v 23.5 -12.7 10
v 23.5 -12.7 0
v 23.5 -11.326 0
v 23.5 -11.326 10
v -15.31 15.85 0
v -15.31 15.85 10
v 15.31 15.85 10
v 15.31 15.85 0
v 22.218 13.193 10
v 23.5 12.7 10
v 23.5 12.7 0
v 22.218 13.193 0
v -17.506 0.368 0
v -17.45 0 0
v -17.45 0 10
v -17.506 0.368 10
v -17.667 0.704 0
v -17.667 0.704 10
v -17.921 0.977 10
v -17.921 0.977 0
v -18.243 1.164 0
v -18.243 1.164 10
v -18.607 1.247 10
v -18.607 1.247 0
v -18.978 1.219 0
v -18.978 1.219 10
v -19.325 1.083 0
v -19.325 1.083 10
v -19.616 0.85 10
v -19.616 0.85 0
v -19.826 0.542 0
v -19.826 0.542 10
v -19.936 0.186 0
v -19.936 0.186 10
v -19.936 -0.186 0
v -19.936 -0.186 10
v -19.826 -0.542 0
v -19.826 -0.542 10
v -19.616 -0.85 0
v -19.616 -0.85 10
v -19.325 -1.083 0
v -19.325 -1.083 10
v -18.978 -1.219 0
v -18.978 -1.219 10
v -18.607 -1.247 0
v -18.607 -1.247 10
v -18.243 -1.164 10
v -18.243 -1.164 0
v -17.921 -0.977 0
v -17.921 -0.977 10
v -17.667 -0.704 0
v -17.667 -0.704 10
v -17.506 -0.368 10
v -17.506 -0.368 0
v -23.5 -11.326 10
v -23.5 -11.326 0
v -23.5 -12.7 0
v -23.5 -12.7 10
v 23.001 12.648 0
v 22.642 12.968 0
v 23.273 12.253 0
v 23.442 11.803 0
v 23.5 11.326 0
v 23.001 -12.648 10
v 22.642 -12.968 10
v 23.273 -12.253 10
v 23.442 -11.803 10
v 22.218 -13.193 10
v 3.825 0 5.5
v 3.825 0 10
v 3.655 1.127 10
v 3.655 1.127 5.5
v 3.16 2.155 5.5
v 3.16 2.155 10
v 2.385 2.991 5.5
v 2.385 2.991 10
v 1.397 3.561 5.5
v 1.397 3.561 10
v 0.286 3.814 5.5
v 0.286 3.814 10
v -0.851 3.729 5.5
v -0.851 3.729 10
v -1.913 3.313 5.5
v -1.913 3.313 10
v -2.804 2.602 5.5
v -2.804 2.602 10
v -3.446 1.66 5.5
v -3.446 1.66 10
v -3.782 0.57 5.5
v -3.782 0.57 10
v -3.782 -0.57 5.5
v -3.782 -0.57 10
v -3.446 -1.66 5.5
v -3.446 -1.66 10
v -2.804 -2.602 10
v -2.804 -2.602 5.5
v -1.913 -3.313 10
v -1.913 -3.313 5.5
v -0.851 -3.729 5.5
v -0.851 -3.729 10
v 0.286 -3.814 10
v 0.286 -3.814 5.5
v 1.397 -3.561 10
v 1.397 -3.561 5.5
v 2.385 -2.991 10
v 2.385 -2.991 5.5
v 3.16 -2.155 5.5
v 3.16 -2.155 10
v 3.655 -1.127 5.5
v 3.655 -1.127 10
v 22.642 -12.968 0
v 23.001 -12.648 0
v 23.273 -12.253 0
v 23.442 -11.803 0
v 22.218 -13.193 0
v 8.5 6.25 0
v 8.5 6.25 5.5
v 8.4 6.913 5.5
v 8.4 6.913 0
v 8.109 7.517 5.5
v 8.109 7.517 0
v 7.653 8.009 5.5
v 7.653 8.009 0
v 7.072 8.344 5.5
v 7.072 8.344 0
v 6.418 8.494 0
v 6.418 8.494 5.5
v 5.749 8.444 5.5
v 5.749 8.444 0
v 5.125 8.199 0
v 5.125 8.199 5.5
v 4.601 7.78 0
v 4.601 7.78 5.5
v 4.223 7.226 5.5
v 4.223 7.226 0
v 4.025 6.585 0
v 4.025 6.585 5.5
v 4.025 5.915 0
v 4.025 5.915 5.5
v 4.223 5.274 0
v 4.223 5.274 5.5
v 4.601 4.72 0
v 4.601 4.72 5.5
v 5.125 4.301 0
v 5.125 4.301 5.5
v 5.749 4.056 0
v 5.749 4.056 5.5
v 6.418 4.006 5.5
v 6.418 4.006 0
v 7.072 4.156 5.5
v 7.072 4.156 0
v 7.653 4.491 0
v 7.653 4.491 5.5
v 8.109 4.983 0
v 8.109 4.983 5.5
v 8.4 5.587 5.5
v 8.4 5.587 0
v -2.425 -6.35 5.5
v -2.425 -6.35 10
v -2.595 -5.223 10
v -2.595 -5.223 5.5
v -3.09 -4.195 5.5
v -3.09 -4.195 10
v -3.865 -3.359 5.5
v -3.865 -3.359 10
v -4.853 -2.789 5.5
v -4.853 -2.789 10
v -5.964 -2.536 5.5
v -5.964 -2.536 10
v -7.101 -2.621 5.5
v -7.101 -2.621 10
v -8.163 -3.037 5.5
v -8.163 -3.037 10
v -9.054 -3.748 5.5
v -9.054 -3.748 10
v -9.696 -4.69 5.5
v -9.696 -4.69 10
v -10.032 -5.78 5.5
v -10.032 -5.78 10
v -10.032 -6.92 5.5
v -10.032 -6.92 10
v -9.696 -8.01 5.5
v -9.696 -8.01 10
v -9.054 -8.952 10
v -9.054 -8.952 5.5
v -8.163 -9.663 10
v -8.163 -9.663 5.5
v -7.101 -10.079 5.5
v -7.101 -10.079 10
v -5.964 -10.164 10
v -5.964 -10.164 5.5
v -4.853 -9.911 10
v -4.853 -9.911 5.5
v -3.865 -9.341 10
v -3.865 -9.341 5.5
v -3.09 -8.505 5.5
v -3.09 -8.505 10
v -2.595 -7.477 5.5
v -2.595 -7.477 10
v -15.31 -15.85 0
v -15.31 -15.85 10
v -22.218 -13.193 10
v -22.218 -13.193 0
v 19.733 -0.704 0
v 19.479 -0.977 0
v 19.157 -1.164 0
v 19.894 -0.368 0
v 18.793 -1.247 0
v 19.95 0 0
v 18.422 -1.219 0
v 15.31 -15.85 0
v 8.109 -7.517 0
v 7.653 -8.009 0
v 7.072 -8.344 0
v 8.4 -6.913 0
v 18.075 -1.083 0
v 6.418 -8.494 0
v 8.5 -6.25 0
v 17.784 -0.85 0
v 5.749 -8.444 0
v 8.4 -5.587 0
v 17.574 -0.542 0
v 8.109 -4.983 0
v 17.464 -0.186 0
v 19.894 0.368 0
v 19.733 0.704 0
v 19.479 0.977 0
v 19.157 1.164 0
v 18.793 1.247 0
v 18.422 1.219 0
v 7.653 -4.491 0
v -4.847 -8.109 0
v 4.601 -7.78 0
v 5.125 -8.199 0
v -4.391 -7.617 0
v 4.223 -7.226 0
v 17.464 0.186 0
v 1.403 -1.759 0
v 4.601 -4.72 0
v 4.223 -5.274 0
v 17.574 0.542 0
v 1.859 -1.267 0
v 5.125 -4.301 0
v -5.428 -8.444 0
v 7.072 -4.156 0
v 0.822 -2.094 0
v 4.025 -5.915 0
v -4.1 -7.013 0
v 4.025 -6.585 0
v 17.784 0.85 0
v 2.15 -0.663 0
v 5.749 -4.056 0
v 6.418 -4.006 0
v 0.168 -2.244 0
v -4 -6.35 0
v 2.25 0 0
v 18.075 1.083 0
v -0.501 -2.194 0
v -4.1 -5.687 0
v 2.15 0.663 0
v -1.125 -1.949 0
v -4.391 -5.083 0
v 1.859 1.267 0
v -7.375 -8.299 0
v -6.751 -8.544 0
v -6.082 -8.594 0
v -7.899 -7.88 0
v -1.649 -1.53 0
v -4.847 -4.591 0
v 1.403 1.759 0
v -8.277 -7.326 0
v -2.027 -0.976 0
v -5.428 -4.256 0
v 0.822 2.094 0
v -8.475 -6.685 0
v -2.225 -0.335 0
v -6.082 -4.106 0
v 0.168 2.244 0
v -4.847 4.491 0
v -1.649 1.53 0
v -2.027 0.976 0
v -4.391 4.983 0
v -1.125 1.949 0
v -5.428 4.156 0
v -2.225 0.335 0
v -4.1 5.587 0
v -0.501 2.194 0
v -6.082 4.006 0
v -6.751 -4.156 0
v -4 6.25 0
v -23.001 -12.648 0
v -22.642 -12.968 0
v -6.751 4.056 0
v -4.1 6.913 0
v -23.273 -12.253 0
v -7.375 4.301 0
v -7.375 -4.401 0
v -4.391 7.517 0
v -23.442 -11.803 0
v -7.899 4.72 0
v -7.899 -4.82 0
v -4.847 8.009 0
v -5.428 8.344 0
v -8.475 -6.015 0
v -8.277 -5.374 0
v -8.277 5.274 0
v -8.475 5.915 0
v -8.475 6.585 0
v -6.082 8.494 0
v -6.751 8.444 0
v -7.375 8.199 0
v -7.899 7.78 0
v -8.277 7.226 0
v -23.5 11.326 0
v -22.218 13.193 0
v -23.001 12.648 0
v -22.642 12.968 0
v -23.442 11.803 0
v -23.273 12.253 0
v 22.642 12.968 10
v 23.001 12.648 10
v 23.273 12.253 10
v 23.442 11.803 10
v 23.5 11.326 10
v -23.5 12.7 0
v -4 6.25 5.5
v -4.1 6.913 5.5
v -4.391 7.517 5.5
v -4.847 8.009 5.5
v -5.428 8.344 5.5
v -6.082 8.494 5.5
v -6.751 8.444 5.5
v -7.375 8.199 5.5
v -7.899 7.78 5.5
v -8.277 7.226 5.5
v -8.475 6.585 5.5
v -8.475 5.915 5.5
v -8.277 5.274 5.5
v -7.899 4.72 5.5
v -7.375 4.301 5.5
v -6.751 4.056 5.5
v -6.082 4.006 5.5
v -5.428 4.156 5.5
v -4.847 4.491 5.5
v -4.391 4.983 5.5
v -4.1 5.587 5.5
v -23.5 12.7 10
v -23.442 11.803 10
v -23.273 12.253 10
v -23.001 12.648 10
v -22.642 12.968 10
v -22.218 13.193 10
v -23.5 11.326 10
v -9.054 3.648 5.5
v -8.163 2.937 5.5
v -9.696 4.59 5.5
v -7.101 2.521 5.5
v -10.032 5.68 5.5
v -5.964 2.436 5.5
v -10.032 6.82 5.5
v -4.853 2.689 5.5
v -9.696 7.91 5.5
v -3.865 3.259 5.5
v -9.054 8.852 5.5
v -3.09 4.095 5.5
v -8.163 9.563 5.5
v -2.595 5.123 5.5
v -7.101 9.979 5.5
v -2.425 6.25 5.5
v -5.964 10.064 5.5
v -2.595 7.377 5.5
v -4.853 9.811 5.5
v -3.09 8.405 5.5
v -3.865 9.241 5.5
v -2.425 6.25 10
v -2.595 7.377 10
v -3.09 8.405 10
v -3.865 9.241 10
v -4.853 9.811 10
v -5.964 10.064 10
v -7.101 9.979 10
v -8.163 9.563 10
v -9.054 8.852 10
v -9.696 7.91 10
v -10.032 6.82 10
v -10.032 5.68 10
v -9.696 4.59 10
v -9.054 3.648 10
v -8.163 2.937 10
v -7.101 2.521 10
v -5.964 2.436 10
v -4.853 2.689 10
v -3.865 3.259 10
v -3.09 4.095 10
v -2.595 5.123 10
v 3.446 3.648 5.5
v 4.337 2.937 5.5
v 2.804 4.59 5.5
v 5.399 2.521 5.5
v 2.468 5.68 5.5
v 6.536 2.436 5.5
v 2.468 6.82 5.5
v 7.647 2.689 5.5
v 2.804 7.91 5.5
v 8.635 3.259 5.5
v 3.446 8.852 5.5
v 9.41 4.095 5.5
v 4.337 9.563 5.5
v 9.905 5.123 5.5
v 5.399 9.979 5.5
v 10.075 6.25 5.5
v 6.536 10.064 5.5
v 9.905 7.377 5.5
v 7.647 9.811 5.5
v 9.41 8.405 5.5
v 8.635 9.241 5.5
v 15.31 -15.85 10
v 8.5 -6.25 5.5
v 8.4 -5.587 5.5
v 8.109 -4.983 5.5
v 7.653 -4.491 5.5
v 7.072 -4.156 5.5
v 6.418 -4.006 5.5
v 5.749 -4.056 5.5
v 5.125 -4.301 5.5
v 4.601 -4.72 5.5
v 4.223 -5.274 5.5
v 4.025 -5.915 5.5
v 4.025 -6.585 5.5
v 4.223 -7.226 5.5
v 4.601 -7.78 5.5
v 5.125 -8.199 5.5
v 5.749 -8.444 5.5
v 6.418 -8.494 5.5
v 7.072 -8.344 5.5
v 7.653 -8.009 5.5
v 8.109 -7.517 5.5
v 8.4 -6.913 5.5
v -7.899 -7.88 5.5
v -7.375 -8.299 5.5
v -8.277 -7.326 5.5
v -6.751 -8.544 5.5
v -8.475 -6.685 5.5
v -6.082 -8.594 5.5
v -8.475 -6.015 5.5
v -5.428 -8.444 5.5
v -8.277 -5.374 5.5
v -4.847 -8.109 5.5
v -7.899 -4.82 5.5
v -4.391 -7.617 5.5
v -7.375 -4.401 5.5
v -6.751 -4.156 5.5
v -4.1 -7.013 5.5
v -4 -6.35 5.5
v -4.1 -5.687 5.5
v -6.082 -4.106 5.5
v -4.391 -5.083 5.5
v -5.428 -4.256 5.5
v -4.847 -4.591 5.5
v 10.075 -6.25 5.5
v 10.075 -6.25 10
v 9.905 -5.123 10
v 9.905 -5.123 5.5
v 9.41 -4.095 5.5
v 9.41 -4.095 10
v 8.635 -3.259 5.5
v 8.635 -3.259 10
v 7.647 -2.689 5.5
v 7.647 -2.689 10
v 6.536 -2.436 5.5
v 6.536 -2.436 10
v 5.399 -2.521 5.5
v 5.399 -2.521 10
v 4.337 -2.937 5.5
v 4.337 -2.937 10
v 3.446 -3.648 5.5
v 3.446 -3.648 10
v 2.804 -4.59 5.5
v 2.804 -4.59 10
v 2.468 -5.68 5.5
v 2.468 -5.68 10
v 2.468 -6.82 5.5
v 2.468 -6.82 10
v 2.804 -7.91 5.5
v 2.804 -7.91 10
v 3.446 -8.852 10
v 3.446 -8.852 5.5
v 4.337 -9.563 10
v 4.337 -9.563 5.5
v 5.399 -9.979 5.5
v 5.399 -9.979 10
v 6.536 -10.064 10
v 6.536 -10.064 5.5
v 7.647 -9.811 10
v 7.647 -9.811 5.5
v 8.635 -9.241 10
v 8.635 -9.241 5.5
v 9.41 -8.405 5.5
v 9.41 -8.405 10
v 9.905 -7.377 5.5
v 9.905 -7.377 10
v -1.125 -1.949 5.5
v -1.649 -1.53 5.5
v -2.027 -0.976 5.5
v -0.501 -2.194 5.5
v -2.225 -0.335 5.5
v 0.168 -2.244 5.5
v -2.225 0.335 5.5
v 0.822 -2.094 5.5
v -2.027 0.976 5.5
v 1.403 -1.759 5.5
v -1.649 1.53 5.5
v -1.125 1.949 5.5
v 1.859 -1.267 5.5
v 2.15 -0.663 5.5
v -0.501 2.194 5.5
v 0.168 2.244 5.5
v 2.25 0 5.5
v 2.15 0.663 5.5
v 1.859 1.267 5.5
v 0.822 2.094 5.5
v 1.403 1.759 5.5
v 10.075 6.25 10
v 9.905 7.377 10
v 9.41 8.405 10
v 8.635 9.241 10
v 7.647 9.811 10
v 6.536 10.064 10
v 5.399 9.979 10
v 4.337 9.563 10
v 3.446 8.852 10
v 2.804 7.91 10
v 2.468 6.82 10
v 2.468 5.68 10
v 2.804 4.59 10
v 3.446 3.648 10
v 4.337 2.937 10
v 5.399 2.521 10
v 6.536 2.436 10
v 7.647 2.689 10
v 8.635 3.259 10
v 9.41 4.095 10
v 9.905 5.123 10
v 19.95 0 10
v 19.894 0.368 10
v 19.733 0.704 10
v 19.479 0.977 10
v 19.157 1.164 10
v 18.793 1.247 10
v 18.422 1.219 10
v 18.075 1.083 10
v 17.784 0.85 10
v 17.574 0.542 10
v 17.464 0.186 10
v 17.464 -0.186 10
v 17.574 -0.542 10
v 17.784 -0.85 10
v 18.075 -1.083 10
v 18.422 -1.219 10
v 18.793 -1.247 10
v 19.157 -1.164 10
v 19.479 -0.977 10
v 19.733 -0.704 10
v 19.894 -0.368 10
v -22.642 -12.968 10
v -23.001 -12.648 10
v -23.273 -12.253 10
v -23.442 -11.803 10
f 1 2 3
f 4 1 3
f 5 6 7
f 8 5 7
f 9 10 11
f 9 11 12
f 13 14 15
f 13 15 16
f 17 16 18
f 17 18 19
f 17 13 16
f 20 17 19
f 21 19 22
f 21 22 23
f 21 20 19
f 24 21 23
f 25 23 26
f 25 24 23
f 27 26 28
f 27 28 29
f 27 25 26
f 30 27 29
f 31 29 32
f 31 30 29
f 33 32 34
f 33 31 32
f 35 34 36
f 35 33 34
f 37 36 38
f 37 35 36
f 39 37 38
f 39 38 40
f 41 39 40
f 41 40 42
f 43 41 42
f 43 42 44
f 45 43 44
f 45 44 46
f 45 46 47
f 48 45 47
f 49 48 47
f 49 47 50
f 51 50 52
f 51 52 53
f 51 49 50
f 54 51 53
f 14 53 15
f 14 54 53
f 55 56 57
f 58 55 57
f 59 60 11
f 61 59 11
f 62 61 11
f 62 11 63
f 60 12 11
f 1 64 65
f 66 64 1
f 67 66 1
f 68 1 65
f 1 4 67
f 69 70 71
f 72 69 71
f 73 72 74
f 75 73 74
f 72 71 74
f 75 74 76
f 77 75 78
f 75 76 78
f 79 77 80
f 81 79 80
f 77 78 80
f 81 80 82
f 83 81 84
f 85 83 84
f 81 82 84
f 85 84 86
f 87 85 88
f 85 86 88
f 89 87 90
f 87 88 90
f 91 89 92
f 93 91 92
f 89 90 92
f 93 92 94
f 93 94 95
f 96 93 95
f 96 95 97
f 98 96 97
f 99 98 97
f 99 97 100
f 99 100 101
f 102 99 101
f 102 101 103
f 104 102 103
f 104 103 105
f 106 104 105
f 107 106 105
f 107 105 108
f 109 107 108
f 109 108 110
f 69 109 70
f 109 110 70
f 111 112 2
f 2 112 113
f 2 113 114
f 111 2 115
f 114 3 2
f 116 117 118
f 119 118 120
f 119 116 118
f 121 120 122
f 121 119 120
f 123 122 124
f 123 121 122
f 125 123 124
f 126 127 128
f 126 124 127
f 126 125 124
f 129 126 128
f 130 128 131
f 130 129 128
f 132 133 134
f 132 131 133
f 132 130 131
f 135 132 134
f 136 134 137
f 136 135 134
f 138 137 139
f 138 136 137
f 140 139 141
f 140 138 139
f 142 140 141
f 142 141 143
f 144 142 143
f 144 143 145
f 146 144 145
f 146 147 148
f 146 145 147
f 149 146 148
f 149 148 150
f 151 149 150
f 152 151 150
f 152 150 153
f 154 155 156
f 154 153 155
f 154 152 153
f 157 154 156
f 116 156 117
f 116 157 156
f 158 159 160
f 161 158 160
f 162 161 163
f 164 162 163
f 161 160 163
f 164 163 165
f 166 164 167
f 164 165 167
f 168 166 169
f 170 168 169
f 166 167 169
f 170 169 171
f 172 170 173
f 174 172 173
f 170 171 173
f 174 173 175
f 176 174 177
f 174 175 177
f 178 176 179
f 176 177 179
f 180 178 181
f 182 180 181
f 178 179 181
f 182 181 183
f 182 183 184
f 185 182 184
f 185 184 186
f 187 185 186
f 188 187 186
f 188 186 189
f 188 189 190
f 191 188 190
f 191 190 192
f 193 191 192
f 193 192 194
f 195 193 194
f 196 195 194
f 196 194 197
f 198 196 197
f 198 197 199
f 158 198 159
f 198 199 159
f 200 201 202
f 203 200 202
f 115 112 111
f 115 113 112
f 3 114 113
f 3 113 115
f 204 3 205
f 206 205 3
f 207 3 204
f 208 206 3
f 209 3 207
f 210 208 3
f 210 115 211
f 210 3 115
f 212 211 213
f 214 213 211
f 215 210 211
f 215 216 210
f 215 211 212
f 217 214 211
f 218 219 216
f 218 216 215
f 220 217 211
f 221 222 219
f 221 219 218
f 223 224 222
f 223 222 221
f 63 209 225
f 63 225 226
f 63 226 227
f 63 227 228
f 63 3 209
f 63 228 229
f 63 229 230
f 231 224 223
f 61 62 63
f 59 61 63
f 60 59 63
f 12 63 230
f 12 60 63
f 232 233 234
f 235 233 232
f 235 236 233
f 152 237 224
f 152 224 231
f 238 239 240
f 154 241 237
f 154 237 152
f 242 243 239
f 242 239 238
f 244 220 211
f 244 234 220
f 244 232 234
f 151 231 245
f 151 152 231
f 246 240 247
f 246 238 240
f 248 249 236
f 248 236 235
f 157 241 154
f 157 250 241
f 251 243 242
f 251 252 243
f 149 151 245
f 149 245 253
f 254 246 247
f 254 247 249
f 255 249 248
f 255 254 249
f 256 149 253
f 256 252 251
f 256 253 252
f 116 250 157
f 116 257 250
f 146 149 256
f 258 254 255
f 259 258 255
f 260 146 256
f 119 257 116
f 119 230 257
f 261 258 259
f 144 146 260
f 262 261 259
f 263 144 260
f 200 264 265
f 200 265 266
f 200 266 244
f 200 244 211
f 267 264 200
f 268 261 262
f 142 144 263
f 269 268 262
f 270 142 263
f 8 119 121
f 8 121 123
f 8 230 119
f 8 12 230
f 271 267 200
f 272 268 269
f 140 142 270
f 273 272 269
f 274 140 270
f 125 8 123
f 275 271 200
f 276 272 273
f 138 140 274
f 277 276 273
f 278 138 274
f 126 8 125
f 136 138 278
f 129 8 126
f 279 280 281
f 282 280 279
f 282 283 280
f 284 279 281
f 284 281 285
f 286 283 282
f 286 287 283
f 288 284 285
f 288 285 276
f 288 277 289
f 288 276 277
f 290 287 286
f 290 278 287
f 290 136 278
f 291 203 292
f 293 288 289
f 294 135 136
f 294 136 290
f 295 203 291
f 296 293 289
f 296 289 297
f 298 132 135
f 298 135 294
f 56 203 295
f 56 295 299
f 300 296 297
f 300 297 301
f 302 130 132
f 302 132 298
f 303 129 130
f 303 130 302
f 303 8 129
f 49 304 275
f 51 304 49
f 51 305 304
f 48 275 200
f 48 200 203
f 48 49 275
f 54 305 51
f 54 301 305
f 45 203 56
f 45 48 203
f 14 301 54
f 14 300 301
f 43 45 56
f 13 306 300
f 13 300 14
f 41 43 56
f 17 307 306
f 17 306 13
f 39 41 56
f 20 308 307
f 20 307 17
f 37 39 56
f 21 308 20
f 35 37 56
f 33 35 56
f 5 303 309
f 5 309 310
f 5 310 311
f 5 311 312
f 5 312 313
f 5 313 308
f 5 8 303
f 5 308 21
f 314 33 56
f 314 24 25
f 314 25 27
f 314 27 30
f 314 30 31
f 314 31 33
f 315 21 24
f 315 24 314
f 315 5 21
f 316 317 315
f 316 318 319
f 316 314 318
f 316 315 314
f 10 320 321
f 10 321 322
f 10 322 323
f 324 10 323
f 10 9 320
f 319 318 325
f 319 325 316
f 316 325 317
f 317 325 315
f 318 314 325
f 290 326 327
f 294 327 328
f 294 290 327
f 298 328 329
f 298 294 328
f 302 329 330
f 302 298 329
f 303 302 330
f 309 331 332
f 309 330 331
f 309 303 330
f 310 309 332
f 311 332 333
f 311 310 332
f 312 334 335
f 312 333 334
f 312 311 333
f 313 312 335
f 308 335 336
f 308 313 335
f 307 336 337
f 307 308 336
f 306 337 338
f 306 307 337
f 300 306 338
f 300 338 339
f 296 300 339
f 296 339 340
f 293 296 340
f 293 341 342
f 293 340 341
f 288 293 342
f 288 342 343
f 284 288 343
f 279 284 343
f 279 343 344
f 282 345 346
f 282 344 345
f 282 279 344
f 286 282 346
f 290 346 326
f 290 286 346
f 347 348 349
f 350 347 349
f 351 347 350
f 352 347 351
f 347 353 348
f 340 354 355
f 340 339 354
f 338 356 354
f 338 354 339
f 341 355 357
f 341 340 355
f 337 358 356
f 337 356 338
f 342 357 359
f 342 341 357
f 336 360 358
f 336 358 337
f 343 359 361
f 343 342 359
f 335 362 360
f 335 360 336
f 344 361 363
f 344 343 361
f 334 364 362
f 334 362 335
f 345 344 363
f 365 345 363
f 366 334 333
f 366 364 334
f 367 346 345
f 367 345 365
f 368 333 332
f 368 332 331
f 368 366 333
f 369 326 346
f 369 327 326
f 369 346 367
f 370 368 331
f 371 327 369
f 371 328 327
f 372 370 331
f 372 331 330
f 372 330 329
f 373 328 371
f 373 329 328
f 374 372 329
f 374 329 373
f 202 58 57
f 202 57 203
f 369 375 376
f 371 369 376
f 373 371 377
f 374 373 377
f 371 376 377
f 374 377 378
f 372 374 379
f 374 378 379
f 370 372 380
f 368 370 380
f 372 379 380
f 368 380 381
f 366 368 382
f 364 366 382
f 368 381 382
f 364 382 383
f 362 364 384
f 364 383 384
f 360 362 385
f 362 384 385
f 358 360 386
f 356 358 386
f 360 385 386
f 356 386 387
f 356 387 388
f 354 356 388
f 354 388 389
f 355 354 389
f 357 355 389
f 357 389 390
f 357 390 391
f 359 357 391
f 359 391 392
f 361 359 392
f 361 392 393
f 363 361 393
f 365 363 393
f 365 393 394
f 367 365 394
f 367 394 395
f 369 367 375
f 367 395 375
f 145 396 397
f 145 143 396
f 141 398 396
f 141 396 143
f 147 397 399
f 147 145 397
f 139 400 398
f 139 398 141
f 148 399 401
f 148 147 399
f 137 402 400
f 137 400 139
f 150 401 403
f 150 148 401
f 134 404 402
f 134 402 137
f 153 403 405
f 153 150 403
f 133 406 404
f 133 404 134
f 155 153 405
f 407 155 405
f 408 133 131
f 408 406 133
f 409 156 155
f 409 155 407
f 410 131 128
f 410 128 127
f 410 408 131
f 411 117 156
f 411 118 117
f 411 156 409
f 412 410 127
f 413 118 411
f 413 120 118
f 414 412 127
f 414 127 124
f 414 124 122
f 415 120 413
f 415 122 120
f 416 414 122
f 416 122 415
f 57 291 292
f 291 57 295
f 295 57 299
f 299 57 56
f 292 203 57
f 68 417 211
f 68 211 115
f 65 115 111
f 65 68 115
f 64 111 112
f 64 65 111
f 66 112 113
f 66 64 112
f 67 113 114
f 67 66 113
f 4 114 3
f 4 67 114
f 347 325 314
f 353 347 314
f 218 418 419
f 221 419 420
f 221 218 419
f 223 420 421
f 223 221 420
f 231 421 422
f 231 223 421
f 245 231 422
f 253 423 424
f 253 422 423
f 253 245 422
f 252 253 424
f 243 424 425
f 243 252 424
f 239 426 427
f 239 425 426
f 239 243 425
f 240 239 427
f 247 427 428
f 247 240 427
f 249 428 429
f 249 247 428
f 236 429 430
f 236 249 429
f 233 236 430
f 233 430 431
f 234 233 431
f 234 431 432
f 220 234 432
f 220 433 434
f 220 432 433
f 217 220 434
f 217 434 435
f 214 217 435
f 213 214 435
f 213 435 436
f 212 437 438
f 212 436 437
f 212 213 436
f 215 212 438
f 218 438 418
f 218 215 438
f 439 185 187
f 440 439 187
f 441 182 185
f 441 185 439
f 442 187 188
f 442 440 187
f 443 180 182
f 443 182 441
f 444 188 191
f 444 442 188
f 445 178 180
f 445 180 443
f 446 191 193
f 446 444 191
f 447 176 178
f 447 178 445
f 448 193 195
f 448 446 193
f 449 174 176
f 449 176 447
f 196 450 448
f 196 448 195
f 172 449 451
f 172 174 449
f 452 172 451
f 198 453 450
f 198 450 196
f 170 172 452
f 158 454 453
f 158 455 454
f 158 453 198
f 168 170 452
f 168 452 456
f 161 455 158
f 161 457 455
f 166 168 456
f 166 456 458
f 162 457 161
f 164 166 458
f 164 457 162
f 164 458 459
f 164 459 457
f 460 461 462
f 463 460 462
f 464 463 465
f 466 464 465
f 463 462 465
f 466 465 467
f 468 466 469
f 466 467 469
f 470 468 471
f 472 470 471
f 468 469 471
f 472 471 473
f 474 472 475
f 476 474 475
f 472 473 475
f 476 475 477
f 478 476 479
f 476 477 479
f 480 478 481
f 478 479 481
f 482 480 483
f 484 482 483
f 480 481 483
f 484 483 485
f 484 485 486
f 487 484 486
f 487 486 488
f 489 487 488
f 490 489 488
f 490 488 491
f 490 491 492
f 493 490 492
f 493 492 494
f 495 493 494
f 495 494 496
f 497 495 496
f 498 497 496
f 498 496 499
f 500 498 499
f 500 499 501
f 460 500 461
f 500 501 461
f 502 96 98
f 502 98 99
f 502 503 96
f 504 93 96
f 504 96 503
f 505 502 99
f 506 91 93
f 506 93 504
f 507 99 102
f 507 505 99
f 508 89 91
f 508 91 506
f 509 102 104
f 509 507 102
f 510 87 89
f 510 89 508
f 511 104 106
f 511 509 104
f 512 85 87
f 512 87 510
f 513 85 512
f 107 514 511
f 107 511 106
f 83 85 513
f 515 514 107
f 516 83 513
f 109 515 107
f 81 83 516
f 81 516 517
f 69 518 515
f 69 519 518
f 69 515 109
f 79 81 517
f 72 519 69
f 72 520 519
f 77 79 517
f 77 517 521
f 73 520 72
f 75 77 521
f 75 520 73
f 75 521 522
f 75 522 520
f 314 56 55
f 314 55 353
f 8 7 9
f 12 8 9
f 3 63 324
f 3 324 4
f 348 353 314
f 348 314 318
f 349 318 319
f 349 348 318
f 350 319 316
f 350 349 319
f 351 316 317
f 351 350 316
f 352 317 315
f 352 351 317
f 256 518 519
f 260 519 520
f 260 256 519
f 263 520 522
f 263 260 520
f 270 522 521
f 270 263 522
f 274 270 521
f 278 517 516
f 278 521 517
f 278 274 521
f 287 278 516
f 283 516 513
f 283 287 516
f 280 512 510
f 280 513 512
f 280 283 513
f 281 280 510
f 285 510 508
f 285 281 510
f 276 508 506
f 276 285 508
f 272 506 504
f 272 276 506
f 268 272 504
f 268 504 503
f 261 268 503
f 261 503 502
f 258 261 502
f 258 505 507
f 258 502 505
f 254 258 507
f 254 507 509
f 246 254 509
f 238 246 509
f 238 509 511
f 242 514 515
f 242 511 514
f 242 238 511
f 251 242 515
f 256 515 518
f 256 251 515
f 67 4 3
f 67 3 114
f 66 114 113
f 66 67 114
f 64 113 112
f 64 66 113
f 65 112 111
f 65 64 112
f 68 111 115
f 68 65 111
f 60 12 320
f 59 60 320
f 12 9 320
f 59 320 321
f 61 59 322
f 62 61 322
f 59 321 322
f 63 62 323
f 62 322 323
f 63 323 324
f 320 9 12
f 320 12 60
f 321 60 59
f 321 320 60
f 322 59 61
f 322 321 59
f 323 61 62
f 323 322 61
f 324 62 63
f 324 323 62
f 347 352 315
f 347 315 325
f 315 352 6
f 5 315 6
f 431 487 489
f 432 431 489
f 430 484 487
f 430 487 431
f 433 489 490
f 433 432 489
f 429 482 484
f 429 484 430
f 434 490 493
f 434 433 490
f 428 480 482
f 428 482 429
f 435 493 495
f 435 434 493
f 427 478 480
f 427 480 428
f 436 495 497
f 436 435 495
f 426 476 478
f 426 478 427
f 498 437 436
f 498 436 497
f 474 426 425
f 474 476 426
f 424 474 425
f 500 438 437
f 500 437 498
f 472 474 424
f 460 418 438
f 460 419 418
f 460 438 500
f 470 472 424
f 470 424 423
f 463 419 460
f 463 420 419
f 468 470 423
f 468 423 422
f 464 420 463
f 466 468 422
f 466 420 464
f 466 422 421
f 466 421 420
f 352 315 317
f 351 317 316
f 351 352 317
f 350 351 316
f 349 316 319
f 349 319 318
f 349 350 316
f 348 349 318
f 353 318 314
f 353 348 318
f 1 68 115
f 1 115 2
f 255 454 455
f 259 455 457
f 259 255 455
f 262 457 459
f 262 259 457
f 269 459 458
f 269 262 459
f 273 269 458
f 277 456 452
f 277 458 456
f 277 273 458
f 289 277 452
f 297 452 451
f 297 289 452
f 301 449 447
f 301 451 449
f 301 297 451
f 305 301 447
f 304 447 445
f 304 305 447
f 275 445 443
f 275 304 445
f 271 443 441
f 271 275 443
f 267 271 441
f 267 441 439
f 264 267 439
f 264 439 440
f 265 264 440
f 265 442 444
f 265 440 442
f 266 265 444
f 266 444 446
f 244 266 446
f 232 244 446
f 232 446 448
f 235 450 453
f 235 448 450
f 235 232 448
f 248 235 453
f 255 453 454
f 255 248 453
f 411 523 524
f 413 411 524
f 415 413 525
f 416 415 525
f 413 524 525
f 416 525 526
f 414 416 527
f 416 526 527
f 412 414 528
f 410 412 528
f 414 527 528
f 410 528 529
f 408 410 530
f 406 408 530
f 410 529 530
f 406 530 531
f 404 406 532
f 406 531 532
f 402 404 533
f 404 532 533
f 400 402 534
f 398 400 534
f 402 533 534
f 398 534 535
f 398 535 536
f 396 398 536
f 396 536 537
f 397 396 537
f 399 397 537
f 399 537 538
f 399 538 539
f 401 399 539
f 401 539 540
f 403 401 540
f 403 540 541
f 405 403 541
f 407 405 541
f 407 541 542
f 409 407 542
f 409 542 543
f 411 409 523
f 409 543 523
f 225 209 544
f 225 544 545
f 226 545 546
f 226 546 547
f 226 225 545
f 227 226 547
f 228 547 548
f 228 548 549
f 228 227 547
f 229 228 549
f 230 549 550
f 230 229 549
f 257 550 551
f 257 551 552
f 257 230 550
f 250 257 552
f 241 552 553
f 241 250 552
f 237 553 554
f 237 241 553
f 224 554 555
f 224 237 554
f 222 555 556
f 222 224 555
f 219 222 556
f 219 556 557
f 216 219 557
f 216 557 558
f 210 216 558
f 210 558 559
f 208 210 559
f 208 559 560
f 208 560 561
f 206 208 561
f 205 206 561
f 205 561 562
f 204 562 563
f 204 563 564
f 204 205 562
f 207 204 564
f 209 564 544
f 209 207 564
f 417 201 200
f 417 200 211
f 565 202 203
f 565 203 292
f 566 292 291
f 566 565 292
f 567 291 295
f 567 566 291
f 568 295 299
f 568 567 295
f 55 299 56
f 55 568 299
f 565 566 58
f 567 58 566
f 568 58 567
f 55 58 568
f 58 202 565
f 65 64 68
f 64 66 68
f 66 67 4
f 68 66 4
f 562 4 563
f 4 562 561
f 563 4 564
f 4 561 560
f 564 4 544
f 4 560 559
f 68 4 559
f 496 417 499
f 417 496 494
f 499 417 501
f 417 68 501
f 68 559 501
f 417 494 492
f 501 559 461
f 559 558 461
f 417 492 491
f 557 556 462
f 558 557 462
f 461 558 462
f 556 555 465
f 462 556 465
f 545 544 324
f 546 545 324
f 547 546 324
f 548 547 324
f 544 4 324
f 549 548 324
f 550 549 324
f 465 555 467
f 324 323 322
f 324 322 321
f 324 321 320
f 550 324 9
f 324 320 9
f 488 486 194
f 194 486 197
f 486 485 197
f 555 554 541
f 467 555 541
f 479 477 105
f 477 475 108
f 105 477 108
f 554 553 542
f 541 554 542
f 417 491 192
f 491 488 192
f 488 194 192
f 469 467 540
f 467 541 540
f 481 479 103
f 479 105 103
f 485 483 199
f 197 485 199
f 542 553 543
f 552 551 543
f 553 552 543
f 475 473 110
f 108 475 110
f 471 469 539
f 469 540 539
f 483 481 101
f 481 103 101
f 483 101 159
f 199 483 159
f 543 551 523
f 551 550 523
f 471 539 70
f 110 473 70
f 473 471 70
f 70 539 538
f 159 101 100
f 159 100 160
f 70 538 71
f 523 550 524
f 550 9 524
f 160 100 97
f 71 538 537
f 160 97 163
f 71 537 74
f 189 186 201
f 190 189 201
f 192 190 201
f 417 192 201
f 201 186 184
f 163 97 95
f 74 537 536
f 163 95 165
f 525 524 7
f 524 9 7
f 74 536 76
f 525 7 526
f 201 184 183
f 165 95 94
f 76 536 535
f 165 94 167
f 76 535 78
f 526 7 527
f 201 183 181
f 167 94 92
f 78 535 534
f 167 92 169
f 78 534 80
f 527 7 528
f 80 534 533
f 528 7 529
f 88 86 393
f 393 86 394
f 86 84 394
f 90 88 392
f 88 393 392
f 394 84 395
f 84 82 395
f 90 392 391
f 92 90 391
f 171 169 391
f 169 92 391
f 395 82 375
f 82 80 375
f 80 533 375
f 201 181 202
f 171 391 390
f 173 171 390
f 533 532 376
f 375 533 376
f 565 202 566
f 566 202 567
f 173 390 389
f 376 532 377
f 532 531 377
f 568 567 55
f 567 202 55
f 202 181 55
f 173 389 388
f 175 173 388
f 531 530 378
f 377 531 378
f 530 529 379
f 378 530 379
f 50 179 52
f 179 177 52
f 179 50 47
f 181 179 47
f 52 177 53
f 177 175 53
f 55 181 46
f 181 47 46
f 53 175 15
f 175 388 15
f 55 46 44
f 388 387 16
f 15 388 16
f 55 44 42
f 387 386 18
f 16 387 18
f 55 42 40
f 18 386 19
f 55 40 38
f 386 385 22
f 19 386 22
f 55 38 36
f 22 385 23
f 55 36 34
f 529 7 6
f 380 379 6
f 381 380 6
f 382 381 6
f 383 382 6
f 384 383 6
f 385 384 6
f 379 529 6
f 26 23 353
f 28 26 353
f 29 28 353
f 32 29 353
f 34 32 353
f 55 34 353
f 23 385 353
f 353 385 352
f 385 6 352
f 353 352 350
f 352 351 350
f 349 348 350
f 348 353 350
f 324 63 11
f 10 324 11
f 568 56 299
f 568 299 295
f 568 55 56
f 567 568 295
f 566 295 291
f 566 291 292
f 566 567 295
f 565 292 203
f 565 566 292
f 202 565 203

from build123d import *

# Parameters (mm, degrees)
SKETCH1_R             = 1.25
SKETCH1_R_2           = 2.25
BOSS_EXTRUDE1_DEPTH   = 10
SKETCH2_R             = 3.825
CUT_EXTRUDE1_DEPTH    = 4.5
CUT_EXTRUDE2_DEPTH    = 10
FILLET1_R             = 2
CUT_EXTRUDE3_DEPTH    = 10
CUT_EXTRUDE4_DEPTH    = 10
CUT_EXTRUDE6_DEPTH    = 10
BOSS_EXTRUDE2_DEPTH   = 10
BOSS_EXTRUDE2_2_DEPTH = 10
BOSS_EXTRUDE2_3_DEPTH = 10
BOSS_EXTRUDE2_4_DEPTH = 10


with BuildPart() as part:
    # Sketch1 → Boss-Extrude1 (new body)
    with BuildSketch(Plane.XY):
        Polygon((-12.7, 23.5), (12.7, 23.5), (23.5, 12.7), (23.5, -12.7), (12.7, -23.5), (-12.7, -23.5), (-23.5, -12.7), (-23.5, 12.7), align=None)
        with Locations((0, 18.7)):
            Circle(SKETCH1_R, mode=Mode.SUBTRACT)
        with Locations((18.7, 0)):
            Circle(SKETCH1_R, mode=Mode.SUBTRACT)
        with Locations((0, -18.7)):
            Circle(SKETCH1_R, mode=Mode.SUBTRACT)
        with Locations((-18.7, 0)):
            Circle(SKETCH1_R, mode=Mode.SUBTRACT)
        Circle(SKETCH1_R_2, mode=Mode.SUBTRACT)
        with Locations((-6.25, 6.25)):
            Circle(SKETCH1_R_2, mode=Mode.SUBTRACT)
        with Locations((6.25, 6.25)):
            Circle(SKETCH1_R_2, mode=Mode.SUBTRACT)
        with Locations((6.25, -6.25)):
            Circle(SKETCH1_R_2, mode=Mode.SUBTRACT)
        with Locations((-6.25, -6.35)):
            Circle(SKETCH1_R_2, mode=Mode.SUBTRACT)
    extrude(amount=BOSS_EXTRUDE1_DEPTH)

    # Sketch2 → Cut-Extrude1 (cut)
    with BuildSketch(Plane.XY.offset(10)):
        with Locations((-6.25, 6.25)):
            Circle(SKETCH2_R)
        with Locations((6.25, 6.25)):
            Circle(SKETCH2_R)
        Circle(SKETCH2_R)
        with Locations((-6.25, -6.35)):
            Circle(SKETCH2_R)
        with Locations((6.25, -6.25)):
            Circle(SKETCH2_R)
    extrude(amount=-CUT_EXTRUDE1_DEPTH, mode=Mode.SUBTRACT)

    # Sketch3 → Cut-Extrude2 (cut)
    with BuildSketch(Plane.XY.offset(10)):
        Polygon((12.7, 23.5), (15.7, 15.7), (23.5, 12.7), align=None)
        Polygon((23.5, -12.7), (15.7, -15.7), (12.7, -23.5), align=None)
        Polygon((-12.7, -23.5), (-15.7, -15.7), (-23.5, -12.7), align=None)
        Polygon((-23.5, 12.7), (-15.7, 15.7), (-12.7, 23.5), align=None)
    extrude(amount=-CUT_EXTRUDE2_DEPTH, mode=Mode.SUBTRACT)

    # Fillet1
    fillet1_edges = [part.edges().sort_by_distance(p)[0] for p in [
        (15.7, 15.7, 5),
        (15.7, -15.7, 5),
        (-15.7, -15.7, 5),
        (-23.5, -12.7, 5),
        (-23.5, 12.7, 5),
        (-12.7, 23.5, 5),
        (12.7, 23.5, 5),
        (23.5, 12.7, 5),
        (23.5, -12.7, 5),
        (12.7, -23.5, 5),
        (-12.7, -23.5, 5),
        (-15.7, 15.7, 5),
    ]]
    fillet(fillet1_edges, radius=FILLET1_R)

    # Sketch5 → Cut-Extrude3 (cut)
    with BuildSketch(Plane.XY.offset(10)):
        with BuildLine():
            Line((-15.788258503, 15.88), (15.788258503, 15.88))
            ThreePointArc((15.788258503, 15.88), (15.553157953, 16.185115491), (15.380907485, 16.529640539))
            Line((15.380907485, 16.529640539), (13.193093016, 22.217958159))
            ThreePointArc((13.193093016, 22.217958159), (12.458674669, 23.14862311), (11.326401804, 23.5))
            Line((11.326401804, 23.5), (-11.326401804, 23.5))
            ThreePointArc((-11.326401804, 23.5), (-12.458674669, 23.14862311), (-13.193093016, 22.217958159))
            Line((-13.193093016, 22.217958159), (-15.380907485, 16.529640539))
            ThreePointArc((-15.380907485, 16.529640539), (-15.553157953, 16.185115491), (-15.788258503, 15.88))
        make_face()
        with BuildLine():
            Line((-15.788258503, -15.88), (15.788258503, -15.88))
            ThreePointArc((15.788258503, -15.88), (15.553157953, -16.185115491), (15.380907485, -16.529640539))
            Line((15.380907485, -16.529640539), (13.193093016, -22.217958159))
            ThreePointArc((13.193093016, -22.217958159), (12.458674669, -23.14862311), (11.326401804, -23.5))
            Line((11.326401804, -23.5), (-11.326401804, -23.5))
            ThreePointArc((-11.326401804, -23.5), (-12.458674669, -23.14862311), (-13.193093016, -22.217958159))
            Line((-13.193093016, -22.217958159), (-15.380907485, -16.529640539))
            ThreePointArc((-15.380907485, -16.529640539), (-15.553157953, -16.185115491), (-15.788258503, -15.88))
        make_face()
    extrude(amount=-CUT_EXTRUDE3_DEPTH, mode=Mode.SUBTRACT)

    # Sketch6 → Cut-Extrude4 (cut)
    with BuildSketch(Plane.XY.offset(10)):
        with BuildLine():
            Line((-16.529640539, -15.380907485), (-15.232, -15.88))
            Line((-15.232, -15.88), (-15.788258503, -15.88))
            ThreePointArc((-15.788258503, -15.88), (-16.130714476, -15.588511709), (-16.529640539, -15.380907485))
        make_face()
        with BuildLine():
            Line((15.788258503, -15.88), (15.232, -15.88))
            Line((15.232, -15.88), (16.529640539, -15.380907485))
            ThreePointArc((16.529640539, -15.380907485), (16.130714476, -15.588511709), (15.788258503, -15.88))
        make_face()
        with BuildLine():
            Line((16.529640539, 15.380907485), (15.232, 15.88))
            Line((15.232, 15.88), (15.788258503, 15.88))
            ThreePointArc((15.788258503, 15.88), (16.130714476, 15.588511709), (16.529640539, 15.380907485))
        make_face()
        with BuildLine():
            Line((-15.788258503, 15.88), (-15.232, 15.88))
            Line((-15.232, 15.88), (-16.529640539, 15.380907485))
            ThreePointArc((-16.529640539, 15.380907485), (-16.130714476, 15.588511709), (-15.788258503, 15.88))
        make_face()
    extrude(amount=-CUT_EXTRUDE4_DEPTH, mode=Mode.SUBTRACT)

    # Sketch7 → Cut-Extrude6 (cut)
    with BuildSketch(Plane.XY.offset(10)):
        Polygon((-15.31, 15.85), (15.31, 15.85), (15.232, 15.88), (-15.232, 15.88), align=None)
        Polygon((-15.31, -15.85), (15.31, -15.85), (15.232, -15.88), (-15.232, -15.88), align=None)
    extrude(amount=-CUT_EXTRUDE6_DEPTH, mode=Mode.SUBTRACT)


with BuildPart() as body_2:
    # Sketch8 → Boss-Extrude2 (new body)
    with BuildSketch(Plane.XY.offset(10)):
        with BuildLine():
            Line((-23.5, -11.326401804), (-23.5, -12.7))
            Line((-23.5, -12.7), (-22.217958159, -13.193093016))
            ThreePointArc((-22.217958159, -13.193093016), (-23.14862311, -12.458674669), (-23.5, -11.326401804))
        make_face()
    extrude(amount=-BOSS_EXTRUDE2_DEPTH)


with BuildPart() as body_3:
    # Sketch8 → Boss-Extrude2 2 (new body)
    with BuildSketch(Plane.XY.offset(10)):
        with BuildLine():
            Line((23.5, 11.326401804), (23.5, 12.7))
            Line((23.5, 12.7), (22.217958159, 13.193093016))
            ThreePointArc((22.217958159, 13.193093016), (23.14862311, 12.458674669), (23.5, 11.326401804))
        make_face()
    extrude(amount=-BOSS_EXTRUDE2_2_DEPTH)


with BuildPart() as body_4:
    # Sketch8 → Boss-Extrude2 3 (new body)
    with BuildSketch(Plane.XY.offset(10)):
        with BuildLine():
            Line((-22.217958159, 13.193093016), (-23.5, 12.7))
            Line((-23.5, 12.7), (-23.5, 11.326401804))
            ThreePointArc((-23.5, 11.326401804), (-23.14862311, 12.458674669), (-22.217958159, 13.193093016))
        make_face()
    extrude(amount=-BOSS_EXTRUDE2_3_DEPTH)


with BuildPart() as body_5:
    # Sketch8 → Boss-Extrude2 4 (new body)
    with BuildSketch(Plane.XY.offset(10)):
        with BuildLine():
            Line((22.217958159, -13.193093016), (23.5, -12.7))
            Line((23.5, -12.7), (23.5, -11.326401804))
            ThreePointArc((23.5, -11.326401804), (23.14862311, -12.458674669), (22.217958159, -13.193093016))
        make_face()
    extrude(amount=-BOSS_EXTRUDE2_4_DEPTH)


solid = Compound([part.part, body_2.part, body_3.part, body_4.part, body_5.part])
